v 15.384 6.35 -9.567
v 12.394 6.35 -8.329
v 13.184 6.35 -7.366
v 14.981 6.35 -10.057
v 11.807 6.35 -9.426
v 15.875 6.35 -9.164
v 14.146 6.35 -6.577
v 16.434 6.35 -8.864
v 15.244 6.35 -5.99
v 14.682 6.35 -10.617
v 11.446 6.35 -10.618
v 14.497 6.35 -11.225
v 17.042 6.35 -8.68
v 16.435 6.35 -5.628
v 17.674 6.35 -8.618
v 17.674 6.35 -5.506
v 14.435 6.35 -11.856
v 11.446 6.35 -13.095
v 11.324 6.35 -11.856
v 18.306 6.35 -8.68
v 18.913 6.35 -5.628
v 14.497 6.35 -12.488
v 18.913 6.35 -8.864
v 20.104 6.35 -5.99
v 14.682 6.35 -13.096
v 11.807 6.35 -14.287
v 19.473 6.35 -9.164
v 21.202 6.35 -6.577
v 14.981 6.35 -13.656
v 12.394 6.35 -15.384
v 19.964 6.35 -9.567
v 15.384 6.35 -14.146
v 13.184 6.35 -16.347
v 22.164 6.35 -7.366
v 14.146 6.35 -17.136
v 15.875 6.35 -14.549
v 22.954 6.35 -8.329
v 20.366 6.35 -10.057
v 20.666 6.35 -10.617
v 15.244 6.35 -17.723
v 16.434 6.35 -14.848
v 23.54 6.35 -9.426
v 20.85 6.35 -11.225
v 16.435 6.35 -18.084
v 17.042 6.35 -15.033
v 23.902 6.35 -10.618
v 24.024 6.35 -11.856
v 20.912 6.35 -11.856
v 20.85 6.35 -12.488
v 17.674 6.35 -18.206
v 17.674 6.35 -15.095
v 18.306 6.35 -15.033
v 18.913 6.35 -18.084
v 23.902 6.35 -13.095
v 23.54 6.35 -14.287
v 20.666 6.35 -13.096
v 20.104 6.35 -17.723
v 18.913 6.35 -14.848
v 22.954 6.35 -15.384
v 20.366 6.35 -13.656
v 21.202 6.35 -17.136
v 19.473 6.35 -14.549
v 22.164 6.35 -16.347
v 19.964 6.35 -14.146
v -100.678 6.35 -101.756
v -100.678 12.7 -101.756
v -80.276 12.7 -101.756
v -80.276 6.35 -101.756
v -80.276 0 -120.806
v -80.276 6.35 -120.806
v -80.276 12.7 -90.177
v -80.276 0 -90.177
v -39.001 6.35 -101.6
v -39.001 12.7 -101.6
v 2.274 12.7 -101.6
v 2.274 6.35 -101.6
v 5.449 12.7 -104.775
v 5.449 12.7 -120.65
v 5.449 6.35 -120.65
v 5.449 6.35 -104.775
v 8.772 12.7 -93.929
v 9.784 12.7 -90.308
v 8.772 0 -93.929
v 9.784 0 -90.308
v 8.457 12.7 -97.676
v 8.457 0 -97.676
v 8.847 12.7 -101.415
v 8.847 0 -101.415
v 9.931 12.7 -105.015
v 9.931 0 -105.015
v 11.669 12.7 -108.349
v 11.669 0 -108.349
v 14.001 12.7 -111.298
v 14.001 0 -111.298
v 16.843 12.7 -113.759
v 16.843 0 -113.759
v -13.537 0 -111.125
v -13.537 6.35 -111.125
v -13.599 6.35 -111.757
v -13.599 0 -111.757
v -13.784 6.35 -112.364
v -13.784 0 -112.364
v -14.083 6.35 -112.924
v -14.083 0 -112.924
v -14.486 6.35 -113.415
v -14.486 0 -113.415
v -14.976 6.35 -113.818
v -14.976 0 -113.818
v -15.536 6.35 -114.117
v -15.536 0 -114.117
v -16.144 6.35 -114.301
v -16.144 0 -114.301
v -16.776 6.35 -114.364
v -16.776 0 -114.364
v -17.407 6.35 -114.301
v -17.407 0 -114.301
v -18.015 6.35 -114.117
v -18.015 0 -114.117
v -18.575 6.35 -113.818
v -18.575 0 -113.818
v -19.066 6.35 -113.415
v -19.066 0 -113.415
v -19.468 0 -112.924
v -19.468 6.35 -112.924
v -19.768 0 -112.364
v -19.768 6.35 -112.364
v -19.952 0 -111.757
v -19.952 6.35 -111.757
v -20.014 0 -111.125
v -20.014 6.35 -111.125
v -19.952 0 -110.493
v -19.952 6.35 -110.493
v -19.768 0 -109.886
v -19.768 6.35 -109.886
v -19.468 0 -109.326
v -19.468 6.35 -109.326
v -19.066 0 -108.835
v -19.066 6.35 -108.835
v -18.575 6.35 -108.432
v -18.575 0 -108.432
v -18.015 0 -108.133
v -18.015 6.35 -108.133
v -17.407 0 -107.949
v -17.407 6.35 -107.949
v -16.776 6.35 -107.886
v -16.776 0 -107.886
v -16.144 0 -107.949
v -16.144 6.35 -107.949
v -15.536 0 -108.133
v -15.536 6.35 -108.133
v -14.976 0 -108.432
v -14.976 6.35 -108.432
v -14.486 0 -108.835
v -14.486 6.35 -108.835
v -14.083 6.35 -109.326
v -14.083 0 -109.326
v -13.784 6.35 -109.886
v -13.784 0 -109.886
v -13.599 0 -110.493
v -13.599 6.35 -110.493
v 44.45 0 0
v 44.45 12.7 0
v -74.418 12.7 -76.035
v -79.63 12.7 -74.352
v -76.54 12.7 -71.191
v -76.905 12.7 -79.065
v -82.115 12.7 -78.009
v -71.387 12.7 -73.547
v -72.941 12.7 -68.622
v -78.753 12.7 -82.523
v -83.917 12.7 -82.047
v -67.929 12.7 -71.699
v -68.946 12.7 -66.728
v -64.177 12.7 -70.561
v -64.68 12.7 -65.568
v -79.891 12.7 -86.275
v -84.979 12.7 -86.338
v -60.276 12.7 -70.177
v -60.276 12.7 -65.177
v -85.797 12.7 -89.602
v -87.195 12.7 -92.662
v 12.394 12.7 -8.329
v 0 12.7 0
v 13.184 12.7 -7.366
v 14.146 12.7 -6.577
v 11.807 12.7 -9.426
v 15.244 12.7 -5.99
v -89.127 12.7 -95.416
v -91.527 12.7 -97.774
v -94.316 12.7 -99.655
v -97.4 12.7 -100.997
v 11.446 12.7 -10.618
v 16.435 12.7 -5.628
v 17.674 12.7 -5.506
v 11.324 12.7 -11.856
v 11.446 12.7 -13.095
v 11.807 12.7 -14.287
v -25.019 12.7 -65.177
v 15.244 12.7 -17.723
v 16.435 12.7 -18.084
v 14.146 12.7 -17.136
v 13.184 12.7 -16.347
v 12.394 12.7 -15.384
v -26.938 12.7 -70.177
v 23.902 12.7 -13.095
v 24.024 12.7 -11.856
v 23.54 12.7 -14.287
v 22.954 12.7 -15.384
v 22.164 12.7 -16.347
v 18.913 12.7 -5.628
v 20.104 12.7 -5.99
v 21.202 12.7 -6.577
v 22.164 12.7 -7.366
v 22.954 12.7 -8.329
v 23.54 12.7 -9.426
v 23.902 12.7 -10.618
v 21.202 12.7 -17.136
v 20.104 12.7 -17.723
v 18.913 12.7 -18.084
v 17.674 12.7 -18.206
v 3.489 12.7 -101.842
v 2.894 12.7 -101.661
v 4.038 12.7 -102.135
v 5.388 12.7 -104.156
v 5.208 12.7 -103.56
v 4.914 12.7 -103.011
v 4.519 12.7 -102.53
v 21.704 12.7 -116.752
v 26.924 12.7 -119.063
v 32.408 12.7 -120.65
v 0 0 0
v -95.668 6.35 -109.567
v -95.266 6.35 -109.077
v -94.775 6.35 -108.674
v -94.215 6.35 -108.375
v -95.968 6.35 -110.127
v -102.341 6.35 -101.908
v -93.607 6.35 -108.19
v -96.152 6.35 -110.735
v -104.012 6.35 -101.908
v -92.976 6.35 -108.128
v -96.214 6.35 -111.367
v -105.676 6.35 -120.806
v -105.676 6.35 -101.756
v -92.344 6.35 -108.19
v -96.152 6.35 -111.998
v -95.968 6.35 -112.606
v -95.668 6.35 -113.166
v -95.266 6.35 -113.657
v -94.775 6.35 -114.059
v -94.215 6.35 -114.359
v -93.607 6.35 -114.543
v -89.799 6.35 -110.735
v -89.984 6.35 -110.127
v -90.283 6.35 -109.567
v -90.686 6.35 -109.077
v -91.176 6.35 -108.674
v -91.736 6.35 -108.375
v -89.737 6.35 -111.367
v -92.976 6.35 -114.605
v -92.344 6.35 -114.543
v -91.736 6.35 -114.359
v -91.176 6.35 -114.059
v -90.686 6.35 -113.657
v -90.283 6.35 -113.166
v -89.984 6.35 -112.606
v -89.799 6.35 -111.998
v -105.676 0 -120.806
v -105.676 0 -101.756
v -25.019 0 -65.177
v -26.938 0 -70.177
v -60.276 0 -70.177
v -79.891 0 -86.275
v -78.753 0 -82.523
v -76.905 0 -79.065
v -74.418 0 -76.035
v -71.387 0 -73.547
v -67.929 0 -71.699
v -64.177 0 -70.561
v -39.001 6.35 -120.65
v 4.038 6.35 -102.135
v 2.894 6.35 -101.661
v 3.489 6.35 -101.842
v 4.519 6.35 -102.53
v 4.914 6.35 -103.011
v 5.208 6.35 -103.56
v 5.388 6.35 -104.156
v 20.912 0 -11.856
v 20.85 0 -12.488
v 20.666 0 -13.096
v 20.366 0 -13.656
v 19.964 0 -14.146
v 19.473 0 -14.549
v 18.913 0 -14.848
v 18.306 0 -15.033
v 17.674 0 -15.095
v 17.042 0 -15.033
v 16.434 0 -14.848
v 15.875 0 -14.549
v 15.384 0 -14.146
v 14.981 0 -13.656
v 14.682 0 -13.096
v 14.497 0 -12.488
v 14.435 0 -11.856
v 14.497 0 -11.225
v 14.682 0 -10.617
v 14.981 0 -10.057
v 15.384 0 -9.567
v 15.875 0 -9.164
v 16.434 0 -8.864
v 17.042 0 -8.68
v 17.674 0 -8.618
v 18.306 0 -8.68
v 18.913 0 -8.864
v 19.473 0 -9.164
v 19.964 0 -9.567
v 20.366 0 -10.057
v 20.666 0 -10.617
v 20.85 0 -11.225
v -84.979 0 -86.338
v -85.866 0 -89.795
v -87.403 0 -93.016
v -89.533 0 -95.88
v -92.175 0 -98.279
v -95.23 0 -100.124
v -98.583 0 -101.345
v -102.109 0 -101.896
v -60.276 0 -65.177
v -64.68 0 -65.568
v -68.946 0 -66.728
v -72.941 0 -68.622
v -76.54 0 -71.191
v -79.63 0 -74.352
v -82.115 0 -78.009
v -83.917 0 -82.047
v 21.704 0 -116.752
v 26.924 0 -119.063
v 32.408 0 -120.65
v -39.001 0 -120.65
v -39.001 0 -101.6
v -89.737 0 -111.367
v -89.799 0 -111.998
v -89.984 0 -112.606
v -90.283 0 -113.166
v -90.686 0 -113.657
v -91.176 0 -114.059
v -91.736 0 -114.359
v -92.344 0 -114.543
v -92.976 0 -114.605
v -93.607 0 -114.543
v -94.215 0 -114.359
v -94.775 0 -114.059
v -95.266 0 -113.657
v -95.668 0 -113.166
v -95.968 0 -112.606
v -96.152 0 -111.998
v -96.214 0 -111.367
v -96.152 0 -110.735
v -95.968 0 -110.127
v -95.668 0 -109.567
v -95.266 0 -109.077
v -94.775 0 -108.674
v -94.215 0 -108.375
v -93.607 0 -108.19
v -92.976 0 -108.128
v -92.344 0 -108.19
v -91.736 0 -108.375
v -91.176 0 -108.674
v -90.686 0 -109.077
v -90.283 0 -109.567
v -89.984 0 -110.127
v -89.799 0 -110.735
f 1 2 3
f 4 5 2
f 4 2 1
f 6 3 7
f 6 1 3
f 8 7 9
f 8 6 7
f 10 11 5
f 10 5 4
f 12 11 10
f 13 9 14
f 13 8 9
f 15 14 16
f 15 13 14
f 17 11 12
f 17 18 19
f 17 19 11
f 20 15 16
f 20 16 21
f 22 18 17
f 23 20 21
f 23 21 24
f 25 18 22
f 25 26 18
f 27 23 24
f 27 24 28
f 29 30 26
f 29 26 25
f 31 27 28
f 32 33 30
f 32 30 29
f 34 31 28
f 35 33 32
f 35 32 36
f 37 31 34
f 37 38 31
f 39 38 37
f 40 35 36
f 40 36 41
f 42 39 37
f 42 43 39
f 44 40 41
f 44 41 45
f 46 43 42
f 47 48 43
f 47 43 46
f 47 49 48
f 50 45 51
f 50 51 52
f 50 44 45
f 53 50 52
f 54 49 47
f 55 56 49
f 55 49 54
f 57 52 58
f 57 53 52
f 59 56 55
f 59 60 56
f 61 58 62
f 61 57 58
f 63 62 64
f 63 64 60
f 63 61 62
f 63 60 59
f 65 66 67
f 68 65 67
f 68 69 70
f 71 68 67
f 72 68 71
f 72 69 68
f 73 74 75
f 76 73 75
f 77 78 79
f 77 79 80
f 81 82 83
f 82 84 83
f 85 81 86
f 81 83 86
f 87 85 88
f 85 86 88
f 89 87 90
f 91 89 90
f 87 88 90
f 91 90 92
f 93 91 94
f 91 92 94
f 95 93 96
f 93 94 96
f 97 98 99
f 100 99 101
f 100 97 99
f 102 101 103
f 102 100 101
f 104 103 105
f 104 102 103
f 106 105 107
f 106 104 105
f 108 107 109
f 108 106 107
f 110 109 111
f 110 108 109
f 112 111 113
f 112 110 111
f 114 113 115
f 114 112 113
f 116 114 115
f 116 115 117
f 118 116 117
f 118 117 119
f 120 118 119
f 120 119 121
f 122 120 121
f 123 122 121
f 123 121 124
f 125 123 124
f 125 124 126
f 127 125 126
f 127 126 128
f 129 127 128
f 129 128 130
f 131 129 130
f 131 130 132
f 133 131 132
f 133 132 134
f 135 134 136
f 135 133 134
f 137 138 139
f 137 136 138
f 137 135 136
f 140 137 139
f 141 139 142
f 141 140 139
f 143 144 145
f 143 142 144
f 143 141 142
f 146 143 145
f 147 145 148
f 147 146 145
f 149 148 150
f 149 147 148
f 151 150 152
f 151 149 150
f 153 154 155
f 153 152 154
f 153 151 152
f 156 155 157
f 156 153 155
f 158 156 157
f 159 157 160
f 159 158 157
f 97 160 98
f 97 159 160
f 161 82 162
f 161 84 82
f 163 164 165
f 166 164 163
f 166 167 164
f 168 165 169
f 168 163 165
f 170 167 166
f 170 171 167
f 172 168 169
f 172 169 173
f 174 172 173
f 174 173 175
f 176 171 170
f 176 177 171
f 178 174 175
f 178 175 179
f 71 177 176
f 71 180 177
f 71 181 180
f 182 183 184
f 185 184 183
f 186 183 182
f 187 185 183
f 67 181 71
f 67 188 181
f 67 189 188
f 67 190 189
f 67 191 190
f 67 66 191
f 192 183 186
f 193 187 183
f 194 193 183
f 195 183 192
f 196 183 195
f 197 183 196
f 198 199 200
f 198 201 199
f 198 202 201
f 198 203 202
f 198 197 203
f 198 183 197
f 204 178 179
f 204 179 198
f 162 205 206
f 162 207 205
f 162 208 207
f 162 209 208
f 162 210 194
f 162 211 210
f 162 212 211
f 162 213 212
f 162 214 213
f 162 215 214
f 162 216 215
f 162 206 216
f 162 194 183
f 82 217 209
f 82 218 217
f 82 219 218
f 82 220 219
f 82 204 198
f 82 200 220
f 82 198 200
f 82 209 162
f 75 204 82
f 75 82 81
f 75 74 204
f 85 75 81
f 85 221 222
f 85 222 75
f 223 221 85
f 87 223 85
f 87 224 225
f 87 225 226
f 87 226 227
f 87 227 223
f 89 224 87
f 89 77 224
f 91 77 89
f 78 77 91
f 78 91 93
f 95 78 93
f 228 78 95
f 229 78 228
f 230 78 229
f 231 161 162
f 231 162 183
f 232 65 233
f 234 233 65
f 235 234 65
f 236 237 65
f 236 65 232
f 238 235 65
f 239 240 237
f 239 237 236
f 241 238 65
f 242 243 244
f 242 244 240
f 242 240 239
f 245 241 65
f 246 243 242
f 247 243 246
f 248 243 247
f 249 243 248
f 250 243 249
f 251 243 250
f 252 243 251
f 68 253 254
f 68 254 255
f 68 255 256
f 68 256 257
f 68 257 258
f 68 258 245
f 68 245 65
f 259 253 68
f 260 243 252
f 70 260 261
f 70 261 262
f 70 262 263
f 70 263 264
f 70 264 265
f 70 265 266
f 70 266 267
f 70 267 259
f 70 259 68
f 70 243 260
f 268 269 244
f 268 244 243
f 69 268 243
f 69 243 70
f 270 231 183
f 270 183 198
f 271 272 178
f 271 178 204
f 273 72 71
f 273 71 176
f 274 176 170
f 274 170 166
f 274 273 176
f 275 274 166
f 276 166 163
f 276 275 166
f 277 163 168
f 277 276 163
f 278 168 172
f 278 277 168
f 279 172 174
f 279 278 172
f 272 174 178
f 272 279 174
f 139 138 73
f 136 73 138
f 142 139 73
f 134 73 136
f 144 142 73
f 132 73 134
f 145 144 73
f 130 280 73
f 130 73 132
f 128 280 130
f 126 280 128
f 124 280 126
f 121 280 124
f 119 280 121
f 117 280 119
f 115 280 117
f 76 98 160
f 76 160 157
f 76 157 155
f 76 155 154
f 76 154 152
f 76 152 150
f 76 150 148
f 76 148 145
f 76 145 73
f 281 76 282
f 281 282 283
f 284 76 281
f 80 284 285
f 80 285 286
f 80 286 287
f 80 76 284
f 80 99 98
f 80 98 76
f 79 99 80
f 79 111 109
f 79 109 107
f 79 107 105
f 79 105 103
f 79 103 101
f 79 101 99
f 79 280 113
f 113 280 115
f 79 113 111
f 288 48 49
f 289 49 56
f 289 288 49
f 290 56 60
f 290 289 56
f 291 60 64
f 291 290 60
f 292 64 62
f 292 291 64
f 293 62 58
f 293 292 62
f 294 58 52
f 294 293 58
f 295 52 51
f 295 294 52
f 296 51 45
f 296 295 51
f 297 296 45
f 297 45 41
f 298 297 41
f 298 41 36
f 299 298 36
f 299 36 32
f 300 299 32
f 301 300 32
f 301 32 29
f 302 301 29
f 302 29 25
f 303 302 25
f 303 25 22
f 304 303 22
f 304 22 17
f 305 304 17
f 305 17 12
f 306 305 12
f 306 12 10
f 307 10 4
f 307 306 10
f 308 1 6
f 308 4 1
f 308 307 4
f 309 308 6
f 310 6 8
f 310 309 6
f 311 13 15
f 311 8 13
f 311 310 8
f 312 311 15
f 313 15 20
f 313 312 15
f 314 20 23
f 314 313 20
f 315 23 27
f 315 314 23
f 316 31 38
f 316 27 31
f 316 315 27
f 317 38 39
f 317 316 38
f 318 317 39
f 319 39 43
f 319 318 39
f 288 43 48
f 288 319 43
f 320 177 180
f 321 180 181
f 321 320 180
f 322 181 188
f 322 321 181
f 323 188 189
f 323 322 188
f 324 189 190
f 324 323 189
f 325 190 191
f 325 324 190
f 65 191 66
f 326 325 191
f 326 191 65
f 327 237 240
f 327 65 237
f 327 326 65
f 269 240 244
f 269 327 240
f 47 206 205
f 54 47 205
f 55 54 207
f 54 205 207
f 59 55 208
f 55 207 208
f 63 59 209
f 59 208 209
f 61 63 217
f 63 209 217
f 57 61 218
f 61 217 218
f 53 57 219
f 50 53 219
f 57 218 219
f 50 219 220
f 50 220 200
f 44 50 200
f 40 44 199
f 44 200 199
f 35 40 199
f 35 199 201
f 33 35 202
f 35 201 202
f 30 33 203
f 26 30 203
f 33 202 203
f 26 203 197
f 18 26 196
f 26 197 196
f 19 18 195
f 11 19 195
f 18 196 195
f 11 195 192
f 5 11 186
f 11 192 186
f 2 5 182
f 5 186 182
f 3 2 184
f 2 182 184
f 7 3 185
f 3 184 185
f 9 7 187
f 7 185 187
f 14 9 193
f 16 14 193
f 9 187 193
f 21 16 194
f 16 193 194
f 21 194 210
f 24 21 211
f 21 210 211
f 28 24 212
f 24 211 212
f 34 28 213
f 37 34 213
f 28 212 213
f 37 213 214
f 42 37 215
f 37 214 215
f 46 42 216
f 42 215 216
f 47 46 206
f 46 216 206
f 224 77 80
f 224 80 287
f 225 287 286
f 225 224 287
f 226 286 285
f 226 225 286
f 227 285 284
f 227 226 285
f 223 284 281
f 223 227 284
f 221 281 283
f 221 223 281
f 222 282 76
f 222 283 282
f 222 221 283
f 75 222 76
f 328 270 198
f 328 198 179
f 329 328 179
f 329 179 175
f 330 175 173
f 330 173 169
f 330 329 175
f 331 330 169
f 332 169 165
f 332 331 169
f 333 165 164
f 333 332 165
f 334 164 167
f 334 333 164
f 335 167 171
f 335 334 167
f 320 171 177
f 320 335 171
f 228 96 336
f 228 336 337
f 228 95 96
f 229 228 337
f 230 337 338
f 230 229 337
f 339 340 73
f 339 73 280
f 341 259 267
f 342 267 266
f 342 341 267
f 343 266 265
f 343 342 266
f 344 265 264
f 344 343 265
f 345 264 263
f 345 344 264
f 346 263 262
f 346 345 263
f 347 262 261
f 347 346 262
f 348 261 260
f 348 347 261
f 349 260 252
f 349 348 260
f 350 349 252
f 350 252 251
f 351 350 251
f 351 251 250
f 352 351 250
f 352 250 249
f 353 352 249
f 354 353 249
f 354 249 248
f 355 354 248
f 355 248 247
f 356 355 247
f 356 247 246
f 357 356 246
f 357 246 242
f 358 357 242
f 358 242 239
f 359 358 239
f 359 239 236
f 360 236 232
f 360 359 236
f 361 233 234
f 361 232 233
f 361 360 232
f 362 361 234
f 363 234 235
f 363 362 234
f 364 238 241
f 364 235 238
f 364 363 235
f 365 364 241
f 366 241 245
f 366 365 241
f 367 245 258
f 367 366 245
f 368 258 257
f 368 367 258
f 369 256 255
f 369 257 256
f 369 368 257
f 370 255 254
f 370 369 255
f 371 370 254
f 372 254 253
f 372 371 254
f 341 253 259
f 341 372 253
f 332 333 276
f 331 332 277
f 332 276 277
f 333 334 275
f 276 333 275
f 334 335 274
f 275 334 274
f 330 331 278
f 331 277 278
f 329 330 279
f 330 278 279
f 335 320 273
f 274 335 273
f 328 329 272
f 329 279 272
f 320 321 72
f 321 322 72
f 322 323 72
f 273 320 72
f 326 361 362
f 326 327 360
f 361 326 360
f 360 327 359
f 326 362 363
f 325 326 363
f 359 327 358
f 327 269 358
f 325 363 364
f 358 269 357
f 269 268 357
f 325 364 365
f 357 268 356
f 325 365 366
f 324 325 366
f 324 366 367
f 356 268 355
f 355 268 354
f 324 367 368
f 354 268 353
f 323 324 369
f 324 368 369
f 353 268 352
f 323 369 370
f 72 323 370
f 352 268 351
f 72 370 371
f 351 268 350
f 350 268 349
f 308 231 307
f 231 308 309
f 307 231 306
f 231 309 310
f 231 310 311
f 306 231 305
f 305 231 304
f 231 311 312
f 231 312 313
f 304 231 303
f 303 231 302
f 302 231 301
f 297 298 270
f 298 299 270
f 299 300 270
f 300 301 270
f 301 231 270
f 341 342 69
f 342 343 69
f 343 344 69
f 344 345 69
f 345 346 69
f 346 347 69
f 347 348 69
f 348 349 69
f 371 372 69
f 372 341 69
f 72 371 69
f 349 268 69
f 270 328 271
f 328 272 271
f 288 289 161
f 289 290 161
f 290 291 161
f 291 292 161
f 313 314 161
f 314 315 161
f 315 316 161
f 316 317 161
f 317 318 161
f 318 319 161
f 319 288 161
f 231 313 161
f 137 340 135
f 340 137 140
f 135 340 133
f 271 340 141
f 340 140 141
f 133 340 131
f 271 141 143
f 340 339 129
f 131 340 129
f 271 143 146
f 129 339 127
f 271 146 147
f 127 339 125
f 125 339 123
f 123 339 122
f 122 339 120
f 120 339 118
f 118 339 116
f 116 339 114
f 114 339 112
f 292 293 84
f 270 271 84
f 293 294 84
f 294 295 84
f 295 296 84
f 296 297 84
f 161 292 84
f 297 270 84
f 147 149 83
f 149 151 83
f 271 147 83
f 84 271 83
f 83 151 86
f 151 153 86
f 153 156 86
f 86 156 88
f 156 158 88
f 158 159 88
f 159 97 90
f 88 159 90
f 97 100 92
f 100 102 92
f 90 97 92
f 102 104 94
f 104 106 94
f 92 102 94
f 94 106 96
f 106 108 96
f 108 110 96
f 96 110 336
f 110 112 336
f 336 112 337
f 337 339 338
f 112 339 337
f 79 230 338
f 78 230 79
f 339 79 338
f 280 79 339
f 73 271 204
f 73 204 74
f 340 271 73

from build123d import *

# Parameters (mm, degrees)
SKETCH1_R           = 3.2385
BOSS_EXTRUDE1_DEPTH = 12.7
SKETCH2_R           = 6.35
SKETCH2_W           = 44.45
SKETCH2_H           = 19.05
CUT_EXTRUDE1_DEPTH  = 6.35
BOSS_EXTRUDE4_DEPTH = 12.7
FILLET1_R           = 20
SKETCH4_R           = 3.2385
BOSS_EXTRUDE5_DEPTH = 12.7
SKETCH5_W           = 25.4
SKETCH5_H           = 19.05
CUT_EXTRUDE2_DEPTH  = 6.35


with BuildPart() as part:
    # Sketch1 → Boss-Extrude1 (new body)
    with BuildSketch(Plane(origin=(0, 0, 0), x_dir=(1, 0, 0), z_dir=(0, 1, 0))):
        Polygon((0, 0), (-39.00058596, 101.6), (-39.00058596, 120.65), (5.44941404, 120.65), (5.44941404, 101.6), (44.45, 0), align=None)
        with Locations((17.673727041, 11.856471417)):
            Circle(SKETCH1_R, mode=Mode.SUBTRACT)
        with Locations((-16.77558596, 111.125)):
            Circle(SKETCH1_R, mode=Mode.SUBTRACT)
    extrude(amount=BOSS_EXTRUDE1_DEPTH)

    # Sketch2 → Cut-Extrude1 (cut)
    with BuildSketch(Plane(origin=(0, 12.7, 0), x_dir=(1, 0, 0), z_dir=(0, 1, 0))):
        with Locations((17.673727041, 11.856471417)):
            Circle(SKETCH2_R)
        with Locations((-16.77558596, 111.125)):
            Rectangle(SKETCH2_W, SKETCH2_H)
    extrude(amount=-CUT_EXTRUDE1_DEPTH, mode=Mode.SUBTRACT)

    # Sketch3 → Boss-Extrude4 (add)
    with BuildSketch(Plane(origin=(0, 12.7, 0), x_dir=(1, 0, 0), z_dir=(0, 1, 0))):
        with BuildLine():
            Line((32.408197765, 120.65), (5.44941404, 120.65))
            Line((5.44941404, 120.65), (5.44941404, 104.775))
            ThreePointArc((5.44941404, 104.775), (4.519478071, 102.52993597), (2.27441404, 101.6))
            Line((2.27441404, 101.6), (5.44941404, 101.6))
            ThreePointArc((5.44941404, 101.6), (16.992497649, 113.865184538), (32.408197765, 120.65))
        make_face()
    extrude(amount=-BOSS_EXTRUDE4_DEPTH)

    # Fillet1
    fillet1_edges = [part.edges().sort_by_distance(p)[0] for p in [
        (5.44941404, 6.35, -101.6),
    ]]
    fillet(fillet1_edges, radius=FILLET1_R)

    # Sketch4 → Boss-Extrude5 (add)
    with BuildSketch(Plane(origin=(0, 0, 0), x_dir=(1, 0, 0), z_dir=(0, 1, 0))):
        with BuildLine():
            Line((-80.27558596, 101.926821939), (-80.27558596, 90.176821939))
            ThreePointArc((-80.27558596, 90.176821939), (-74.417721583, 76.034686315), (-60.27558596, 70.176821939))
            Line((-60.27558596, 70.176821939), (-26.938358036, 70.176821939))
            Line((-26.938358036, 70.176821939), (-25.01903786, 65.176821939))
            Line((-25.01903786, 65.176821939), (-60.27558596, 65.176821939))
            ThreePointArc((-60.27558596, 65.176821939), (-76.539652165, 71.190507118), (-84.979160459, 86.338409901))
            ThreePointArc((-84.979160459, 86.338409901), (-92.17483168, 98.279259247), (-105.67558596, 101.75649972))
            Line((-105.67558596, 101.75649972), (-105.67558596, 120.80649972))
            Line((-105.67558596, 120.80649972), (-80.27558596, 120.80649972))
            Line((-80.27558596, 120.80649972), (-80.27558596, 101.926821939))
        make_face()
        with Locations((-92.97558596, 111.36666083)):
            Circle(SKETCH4_R, mode=Mode.SUBTRACT)
    extrude(amount=BOSS_EXTRUDE5_DEPTH)

    # Sketch5 → Cut-Extrude2 (cut)
    with BuildSketch(Plane(origin=(0, 12.7, 0), x_dir=(1, 0, 0), z_dir=(0, 1, 0))):
        with Locations((-92.97558596, 111.28149972)):
            Rectangle(SKETCH5_W, SKETCH5_H)
    extrude(amount=-CUT_EXTRUDE2_DEPTH, mode=Mode.SUBTRACT)


solid = part.part
